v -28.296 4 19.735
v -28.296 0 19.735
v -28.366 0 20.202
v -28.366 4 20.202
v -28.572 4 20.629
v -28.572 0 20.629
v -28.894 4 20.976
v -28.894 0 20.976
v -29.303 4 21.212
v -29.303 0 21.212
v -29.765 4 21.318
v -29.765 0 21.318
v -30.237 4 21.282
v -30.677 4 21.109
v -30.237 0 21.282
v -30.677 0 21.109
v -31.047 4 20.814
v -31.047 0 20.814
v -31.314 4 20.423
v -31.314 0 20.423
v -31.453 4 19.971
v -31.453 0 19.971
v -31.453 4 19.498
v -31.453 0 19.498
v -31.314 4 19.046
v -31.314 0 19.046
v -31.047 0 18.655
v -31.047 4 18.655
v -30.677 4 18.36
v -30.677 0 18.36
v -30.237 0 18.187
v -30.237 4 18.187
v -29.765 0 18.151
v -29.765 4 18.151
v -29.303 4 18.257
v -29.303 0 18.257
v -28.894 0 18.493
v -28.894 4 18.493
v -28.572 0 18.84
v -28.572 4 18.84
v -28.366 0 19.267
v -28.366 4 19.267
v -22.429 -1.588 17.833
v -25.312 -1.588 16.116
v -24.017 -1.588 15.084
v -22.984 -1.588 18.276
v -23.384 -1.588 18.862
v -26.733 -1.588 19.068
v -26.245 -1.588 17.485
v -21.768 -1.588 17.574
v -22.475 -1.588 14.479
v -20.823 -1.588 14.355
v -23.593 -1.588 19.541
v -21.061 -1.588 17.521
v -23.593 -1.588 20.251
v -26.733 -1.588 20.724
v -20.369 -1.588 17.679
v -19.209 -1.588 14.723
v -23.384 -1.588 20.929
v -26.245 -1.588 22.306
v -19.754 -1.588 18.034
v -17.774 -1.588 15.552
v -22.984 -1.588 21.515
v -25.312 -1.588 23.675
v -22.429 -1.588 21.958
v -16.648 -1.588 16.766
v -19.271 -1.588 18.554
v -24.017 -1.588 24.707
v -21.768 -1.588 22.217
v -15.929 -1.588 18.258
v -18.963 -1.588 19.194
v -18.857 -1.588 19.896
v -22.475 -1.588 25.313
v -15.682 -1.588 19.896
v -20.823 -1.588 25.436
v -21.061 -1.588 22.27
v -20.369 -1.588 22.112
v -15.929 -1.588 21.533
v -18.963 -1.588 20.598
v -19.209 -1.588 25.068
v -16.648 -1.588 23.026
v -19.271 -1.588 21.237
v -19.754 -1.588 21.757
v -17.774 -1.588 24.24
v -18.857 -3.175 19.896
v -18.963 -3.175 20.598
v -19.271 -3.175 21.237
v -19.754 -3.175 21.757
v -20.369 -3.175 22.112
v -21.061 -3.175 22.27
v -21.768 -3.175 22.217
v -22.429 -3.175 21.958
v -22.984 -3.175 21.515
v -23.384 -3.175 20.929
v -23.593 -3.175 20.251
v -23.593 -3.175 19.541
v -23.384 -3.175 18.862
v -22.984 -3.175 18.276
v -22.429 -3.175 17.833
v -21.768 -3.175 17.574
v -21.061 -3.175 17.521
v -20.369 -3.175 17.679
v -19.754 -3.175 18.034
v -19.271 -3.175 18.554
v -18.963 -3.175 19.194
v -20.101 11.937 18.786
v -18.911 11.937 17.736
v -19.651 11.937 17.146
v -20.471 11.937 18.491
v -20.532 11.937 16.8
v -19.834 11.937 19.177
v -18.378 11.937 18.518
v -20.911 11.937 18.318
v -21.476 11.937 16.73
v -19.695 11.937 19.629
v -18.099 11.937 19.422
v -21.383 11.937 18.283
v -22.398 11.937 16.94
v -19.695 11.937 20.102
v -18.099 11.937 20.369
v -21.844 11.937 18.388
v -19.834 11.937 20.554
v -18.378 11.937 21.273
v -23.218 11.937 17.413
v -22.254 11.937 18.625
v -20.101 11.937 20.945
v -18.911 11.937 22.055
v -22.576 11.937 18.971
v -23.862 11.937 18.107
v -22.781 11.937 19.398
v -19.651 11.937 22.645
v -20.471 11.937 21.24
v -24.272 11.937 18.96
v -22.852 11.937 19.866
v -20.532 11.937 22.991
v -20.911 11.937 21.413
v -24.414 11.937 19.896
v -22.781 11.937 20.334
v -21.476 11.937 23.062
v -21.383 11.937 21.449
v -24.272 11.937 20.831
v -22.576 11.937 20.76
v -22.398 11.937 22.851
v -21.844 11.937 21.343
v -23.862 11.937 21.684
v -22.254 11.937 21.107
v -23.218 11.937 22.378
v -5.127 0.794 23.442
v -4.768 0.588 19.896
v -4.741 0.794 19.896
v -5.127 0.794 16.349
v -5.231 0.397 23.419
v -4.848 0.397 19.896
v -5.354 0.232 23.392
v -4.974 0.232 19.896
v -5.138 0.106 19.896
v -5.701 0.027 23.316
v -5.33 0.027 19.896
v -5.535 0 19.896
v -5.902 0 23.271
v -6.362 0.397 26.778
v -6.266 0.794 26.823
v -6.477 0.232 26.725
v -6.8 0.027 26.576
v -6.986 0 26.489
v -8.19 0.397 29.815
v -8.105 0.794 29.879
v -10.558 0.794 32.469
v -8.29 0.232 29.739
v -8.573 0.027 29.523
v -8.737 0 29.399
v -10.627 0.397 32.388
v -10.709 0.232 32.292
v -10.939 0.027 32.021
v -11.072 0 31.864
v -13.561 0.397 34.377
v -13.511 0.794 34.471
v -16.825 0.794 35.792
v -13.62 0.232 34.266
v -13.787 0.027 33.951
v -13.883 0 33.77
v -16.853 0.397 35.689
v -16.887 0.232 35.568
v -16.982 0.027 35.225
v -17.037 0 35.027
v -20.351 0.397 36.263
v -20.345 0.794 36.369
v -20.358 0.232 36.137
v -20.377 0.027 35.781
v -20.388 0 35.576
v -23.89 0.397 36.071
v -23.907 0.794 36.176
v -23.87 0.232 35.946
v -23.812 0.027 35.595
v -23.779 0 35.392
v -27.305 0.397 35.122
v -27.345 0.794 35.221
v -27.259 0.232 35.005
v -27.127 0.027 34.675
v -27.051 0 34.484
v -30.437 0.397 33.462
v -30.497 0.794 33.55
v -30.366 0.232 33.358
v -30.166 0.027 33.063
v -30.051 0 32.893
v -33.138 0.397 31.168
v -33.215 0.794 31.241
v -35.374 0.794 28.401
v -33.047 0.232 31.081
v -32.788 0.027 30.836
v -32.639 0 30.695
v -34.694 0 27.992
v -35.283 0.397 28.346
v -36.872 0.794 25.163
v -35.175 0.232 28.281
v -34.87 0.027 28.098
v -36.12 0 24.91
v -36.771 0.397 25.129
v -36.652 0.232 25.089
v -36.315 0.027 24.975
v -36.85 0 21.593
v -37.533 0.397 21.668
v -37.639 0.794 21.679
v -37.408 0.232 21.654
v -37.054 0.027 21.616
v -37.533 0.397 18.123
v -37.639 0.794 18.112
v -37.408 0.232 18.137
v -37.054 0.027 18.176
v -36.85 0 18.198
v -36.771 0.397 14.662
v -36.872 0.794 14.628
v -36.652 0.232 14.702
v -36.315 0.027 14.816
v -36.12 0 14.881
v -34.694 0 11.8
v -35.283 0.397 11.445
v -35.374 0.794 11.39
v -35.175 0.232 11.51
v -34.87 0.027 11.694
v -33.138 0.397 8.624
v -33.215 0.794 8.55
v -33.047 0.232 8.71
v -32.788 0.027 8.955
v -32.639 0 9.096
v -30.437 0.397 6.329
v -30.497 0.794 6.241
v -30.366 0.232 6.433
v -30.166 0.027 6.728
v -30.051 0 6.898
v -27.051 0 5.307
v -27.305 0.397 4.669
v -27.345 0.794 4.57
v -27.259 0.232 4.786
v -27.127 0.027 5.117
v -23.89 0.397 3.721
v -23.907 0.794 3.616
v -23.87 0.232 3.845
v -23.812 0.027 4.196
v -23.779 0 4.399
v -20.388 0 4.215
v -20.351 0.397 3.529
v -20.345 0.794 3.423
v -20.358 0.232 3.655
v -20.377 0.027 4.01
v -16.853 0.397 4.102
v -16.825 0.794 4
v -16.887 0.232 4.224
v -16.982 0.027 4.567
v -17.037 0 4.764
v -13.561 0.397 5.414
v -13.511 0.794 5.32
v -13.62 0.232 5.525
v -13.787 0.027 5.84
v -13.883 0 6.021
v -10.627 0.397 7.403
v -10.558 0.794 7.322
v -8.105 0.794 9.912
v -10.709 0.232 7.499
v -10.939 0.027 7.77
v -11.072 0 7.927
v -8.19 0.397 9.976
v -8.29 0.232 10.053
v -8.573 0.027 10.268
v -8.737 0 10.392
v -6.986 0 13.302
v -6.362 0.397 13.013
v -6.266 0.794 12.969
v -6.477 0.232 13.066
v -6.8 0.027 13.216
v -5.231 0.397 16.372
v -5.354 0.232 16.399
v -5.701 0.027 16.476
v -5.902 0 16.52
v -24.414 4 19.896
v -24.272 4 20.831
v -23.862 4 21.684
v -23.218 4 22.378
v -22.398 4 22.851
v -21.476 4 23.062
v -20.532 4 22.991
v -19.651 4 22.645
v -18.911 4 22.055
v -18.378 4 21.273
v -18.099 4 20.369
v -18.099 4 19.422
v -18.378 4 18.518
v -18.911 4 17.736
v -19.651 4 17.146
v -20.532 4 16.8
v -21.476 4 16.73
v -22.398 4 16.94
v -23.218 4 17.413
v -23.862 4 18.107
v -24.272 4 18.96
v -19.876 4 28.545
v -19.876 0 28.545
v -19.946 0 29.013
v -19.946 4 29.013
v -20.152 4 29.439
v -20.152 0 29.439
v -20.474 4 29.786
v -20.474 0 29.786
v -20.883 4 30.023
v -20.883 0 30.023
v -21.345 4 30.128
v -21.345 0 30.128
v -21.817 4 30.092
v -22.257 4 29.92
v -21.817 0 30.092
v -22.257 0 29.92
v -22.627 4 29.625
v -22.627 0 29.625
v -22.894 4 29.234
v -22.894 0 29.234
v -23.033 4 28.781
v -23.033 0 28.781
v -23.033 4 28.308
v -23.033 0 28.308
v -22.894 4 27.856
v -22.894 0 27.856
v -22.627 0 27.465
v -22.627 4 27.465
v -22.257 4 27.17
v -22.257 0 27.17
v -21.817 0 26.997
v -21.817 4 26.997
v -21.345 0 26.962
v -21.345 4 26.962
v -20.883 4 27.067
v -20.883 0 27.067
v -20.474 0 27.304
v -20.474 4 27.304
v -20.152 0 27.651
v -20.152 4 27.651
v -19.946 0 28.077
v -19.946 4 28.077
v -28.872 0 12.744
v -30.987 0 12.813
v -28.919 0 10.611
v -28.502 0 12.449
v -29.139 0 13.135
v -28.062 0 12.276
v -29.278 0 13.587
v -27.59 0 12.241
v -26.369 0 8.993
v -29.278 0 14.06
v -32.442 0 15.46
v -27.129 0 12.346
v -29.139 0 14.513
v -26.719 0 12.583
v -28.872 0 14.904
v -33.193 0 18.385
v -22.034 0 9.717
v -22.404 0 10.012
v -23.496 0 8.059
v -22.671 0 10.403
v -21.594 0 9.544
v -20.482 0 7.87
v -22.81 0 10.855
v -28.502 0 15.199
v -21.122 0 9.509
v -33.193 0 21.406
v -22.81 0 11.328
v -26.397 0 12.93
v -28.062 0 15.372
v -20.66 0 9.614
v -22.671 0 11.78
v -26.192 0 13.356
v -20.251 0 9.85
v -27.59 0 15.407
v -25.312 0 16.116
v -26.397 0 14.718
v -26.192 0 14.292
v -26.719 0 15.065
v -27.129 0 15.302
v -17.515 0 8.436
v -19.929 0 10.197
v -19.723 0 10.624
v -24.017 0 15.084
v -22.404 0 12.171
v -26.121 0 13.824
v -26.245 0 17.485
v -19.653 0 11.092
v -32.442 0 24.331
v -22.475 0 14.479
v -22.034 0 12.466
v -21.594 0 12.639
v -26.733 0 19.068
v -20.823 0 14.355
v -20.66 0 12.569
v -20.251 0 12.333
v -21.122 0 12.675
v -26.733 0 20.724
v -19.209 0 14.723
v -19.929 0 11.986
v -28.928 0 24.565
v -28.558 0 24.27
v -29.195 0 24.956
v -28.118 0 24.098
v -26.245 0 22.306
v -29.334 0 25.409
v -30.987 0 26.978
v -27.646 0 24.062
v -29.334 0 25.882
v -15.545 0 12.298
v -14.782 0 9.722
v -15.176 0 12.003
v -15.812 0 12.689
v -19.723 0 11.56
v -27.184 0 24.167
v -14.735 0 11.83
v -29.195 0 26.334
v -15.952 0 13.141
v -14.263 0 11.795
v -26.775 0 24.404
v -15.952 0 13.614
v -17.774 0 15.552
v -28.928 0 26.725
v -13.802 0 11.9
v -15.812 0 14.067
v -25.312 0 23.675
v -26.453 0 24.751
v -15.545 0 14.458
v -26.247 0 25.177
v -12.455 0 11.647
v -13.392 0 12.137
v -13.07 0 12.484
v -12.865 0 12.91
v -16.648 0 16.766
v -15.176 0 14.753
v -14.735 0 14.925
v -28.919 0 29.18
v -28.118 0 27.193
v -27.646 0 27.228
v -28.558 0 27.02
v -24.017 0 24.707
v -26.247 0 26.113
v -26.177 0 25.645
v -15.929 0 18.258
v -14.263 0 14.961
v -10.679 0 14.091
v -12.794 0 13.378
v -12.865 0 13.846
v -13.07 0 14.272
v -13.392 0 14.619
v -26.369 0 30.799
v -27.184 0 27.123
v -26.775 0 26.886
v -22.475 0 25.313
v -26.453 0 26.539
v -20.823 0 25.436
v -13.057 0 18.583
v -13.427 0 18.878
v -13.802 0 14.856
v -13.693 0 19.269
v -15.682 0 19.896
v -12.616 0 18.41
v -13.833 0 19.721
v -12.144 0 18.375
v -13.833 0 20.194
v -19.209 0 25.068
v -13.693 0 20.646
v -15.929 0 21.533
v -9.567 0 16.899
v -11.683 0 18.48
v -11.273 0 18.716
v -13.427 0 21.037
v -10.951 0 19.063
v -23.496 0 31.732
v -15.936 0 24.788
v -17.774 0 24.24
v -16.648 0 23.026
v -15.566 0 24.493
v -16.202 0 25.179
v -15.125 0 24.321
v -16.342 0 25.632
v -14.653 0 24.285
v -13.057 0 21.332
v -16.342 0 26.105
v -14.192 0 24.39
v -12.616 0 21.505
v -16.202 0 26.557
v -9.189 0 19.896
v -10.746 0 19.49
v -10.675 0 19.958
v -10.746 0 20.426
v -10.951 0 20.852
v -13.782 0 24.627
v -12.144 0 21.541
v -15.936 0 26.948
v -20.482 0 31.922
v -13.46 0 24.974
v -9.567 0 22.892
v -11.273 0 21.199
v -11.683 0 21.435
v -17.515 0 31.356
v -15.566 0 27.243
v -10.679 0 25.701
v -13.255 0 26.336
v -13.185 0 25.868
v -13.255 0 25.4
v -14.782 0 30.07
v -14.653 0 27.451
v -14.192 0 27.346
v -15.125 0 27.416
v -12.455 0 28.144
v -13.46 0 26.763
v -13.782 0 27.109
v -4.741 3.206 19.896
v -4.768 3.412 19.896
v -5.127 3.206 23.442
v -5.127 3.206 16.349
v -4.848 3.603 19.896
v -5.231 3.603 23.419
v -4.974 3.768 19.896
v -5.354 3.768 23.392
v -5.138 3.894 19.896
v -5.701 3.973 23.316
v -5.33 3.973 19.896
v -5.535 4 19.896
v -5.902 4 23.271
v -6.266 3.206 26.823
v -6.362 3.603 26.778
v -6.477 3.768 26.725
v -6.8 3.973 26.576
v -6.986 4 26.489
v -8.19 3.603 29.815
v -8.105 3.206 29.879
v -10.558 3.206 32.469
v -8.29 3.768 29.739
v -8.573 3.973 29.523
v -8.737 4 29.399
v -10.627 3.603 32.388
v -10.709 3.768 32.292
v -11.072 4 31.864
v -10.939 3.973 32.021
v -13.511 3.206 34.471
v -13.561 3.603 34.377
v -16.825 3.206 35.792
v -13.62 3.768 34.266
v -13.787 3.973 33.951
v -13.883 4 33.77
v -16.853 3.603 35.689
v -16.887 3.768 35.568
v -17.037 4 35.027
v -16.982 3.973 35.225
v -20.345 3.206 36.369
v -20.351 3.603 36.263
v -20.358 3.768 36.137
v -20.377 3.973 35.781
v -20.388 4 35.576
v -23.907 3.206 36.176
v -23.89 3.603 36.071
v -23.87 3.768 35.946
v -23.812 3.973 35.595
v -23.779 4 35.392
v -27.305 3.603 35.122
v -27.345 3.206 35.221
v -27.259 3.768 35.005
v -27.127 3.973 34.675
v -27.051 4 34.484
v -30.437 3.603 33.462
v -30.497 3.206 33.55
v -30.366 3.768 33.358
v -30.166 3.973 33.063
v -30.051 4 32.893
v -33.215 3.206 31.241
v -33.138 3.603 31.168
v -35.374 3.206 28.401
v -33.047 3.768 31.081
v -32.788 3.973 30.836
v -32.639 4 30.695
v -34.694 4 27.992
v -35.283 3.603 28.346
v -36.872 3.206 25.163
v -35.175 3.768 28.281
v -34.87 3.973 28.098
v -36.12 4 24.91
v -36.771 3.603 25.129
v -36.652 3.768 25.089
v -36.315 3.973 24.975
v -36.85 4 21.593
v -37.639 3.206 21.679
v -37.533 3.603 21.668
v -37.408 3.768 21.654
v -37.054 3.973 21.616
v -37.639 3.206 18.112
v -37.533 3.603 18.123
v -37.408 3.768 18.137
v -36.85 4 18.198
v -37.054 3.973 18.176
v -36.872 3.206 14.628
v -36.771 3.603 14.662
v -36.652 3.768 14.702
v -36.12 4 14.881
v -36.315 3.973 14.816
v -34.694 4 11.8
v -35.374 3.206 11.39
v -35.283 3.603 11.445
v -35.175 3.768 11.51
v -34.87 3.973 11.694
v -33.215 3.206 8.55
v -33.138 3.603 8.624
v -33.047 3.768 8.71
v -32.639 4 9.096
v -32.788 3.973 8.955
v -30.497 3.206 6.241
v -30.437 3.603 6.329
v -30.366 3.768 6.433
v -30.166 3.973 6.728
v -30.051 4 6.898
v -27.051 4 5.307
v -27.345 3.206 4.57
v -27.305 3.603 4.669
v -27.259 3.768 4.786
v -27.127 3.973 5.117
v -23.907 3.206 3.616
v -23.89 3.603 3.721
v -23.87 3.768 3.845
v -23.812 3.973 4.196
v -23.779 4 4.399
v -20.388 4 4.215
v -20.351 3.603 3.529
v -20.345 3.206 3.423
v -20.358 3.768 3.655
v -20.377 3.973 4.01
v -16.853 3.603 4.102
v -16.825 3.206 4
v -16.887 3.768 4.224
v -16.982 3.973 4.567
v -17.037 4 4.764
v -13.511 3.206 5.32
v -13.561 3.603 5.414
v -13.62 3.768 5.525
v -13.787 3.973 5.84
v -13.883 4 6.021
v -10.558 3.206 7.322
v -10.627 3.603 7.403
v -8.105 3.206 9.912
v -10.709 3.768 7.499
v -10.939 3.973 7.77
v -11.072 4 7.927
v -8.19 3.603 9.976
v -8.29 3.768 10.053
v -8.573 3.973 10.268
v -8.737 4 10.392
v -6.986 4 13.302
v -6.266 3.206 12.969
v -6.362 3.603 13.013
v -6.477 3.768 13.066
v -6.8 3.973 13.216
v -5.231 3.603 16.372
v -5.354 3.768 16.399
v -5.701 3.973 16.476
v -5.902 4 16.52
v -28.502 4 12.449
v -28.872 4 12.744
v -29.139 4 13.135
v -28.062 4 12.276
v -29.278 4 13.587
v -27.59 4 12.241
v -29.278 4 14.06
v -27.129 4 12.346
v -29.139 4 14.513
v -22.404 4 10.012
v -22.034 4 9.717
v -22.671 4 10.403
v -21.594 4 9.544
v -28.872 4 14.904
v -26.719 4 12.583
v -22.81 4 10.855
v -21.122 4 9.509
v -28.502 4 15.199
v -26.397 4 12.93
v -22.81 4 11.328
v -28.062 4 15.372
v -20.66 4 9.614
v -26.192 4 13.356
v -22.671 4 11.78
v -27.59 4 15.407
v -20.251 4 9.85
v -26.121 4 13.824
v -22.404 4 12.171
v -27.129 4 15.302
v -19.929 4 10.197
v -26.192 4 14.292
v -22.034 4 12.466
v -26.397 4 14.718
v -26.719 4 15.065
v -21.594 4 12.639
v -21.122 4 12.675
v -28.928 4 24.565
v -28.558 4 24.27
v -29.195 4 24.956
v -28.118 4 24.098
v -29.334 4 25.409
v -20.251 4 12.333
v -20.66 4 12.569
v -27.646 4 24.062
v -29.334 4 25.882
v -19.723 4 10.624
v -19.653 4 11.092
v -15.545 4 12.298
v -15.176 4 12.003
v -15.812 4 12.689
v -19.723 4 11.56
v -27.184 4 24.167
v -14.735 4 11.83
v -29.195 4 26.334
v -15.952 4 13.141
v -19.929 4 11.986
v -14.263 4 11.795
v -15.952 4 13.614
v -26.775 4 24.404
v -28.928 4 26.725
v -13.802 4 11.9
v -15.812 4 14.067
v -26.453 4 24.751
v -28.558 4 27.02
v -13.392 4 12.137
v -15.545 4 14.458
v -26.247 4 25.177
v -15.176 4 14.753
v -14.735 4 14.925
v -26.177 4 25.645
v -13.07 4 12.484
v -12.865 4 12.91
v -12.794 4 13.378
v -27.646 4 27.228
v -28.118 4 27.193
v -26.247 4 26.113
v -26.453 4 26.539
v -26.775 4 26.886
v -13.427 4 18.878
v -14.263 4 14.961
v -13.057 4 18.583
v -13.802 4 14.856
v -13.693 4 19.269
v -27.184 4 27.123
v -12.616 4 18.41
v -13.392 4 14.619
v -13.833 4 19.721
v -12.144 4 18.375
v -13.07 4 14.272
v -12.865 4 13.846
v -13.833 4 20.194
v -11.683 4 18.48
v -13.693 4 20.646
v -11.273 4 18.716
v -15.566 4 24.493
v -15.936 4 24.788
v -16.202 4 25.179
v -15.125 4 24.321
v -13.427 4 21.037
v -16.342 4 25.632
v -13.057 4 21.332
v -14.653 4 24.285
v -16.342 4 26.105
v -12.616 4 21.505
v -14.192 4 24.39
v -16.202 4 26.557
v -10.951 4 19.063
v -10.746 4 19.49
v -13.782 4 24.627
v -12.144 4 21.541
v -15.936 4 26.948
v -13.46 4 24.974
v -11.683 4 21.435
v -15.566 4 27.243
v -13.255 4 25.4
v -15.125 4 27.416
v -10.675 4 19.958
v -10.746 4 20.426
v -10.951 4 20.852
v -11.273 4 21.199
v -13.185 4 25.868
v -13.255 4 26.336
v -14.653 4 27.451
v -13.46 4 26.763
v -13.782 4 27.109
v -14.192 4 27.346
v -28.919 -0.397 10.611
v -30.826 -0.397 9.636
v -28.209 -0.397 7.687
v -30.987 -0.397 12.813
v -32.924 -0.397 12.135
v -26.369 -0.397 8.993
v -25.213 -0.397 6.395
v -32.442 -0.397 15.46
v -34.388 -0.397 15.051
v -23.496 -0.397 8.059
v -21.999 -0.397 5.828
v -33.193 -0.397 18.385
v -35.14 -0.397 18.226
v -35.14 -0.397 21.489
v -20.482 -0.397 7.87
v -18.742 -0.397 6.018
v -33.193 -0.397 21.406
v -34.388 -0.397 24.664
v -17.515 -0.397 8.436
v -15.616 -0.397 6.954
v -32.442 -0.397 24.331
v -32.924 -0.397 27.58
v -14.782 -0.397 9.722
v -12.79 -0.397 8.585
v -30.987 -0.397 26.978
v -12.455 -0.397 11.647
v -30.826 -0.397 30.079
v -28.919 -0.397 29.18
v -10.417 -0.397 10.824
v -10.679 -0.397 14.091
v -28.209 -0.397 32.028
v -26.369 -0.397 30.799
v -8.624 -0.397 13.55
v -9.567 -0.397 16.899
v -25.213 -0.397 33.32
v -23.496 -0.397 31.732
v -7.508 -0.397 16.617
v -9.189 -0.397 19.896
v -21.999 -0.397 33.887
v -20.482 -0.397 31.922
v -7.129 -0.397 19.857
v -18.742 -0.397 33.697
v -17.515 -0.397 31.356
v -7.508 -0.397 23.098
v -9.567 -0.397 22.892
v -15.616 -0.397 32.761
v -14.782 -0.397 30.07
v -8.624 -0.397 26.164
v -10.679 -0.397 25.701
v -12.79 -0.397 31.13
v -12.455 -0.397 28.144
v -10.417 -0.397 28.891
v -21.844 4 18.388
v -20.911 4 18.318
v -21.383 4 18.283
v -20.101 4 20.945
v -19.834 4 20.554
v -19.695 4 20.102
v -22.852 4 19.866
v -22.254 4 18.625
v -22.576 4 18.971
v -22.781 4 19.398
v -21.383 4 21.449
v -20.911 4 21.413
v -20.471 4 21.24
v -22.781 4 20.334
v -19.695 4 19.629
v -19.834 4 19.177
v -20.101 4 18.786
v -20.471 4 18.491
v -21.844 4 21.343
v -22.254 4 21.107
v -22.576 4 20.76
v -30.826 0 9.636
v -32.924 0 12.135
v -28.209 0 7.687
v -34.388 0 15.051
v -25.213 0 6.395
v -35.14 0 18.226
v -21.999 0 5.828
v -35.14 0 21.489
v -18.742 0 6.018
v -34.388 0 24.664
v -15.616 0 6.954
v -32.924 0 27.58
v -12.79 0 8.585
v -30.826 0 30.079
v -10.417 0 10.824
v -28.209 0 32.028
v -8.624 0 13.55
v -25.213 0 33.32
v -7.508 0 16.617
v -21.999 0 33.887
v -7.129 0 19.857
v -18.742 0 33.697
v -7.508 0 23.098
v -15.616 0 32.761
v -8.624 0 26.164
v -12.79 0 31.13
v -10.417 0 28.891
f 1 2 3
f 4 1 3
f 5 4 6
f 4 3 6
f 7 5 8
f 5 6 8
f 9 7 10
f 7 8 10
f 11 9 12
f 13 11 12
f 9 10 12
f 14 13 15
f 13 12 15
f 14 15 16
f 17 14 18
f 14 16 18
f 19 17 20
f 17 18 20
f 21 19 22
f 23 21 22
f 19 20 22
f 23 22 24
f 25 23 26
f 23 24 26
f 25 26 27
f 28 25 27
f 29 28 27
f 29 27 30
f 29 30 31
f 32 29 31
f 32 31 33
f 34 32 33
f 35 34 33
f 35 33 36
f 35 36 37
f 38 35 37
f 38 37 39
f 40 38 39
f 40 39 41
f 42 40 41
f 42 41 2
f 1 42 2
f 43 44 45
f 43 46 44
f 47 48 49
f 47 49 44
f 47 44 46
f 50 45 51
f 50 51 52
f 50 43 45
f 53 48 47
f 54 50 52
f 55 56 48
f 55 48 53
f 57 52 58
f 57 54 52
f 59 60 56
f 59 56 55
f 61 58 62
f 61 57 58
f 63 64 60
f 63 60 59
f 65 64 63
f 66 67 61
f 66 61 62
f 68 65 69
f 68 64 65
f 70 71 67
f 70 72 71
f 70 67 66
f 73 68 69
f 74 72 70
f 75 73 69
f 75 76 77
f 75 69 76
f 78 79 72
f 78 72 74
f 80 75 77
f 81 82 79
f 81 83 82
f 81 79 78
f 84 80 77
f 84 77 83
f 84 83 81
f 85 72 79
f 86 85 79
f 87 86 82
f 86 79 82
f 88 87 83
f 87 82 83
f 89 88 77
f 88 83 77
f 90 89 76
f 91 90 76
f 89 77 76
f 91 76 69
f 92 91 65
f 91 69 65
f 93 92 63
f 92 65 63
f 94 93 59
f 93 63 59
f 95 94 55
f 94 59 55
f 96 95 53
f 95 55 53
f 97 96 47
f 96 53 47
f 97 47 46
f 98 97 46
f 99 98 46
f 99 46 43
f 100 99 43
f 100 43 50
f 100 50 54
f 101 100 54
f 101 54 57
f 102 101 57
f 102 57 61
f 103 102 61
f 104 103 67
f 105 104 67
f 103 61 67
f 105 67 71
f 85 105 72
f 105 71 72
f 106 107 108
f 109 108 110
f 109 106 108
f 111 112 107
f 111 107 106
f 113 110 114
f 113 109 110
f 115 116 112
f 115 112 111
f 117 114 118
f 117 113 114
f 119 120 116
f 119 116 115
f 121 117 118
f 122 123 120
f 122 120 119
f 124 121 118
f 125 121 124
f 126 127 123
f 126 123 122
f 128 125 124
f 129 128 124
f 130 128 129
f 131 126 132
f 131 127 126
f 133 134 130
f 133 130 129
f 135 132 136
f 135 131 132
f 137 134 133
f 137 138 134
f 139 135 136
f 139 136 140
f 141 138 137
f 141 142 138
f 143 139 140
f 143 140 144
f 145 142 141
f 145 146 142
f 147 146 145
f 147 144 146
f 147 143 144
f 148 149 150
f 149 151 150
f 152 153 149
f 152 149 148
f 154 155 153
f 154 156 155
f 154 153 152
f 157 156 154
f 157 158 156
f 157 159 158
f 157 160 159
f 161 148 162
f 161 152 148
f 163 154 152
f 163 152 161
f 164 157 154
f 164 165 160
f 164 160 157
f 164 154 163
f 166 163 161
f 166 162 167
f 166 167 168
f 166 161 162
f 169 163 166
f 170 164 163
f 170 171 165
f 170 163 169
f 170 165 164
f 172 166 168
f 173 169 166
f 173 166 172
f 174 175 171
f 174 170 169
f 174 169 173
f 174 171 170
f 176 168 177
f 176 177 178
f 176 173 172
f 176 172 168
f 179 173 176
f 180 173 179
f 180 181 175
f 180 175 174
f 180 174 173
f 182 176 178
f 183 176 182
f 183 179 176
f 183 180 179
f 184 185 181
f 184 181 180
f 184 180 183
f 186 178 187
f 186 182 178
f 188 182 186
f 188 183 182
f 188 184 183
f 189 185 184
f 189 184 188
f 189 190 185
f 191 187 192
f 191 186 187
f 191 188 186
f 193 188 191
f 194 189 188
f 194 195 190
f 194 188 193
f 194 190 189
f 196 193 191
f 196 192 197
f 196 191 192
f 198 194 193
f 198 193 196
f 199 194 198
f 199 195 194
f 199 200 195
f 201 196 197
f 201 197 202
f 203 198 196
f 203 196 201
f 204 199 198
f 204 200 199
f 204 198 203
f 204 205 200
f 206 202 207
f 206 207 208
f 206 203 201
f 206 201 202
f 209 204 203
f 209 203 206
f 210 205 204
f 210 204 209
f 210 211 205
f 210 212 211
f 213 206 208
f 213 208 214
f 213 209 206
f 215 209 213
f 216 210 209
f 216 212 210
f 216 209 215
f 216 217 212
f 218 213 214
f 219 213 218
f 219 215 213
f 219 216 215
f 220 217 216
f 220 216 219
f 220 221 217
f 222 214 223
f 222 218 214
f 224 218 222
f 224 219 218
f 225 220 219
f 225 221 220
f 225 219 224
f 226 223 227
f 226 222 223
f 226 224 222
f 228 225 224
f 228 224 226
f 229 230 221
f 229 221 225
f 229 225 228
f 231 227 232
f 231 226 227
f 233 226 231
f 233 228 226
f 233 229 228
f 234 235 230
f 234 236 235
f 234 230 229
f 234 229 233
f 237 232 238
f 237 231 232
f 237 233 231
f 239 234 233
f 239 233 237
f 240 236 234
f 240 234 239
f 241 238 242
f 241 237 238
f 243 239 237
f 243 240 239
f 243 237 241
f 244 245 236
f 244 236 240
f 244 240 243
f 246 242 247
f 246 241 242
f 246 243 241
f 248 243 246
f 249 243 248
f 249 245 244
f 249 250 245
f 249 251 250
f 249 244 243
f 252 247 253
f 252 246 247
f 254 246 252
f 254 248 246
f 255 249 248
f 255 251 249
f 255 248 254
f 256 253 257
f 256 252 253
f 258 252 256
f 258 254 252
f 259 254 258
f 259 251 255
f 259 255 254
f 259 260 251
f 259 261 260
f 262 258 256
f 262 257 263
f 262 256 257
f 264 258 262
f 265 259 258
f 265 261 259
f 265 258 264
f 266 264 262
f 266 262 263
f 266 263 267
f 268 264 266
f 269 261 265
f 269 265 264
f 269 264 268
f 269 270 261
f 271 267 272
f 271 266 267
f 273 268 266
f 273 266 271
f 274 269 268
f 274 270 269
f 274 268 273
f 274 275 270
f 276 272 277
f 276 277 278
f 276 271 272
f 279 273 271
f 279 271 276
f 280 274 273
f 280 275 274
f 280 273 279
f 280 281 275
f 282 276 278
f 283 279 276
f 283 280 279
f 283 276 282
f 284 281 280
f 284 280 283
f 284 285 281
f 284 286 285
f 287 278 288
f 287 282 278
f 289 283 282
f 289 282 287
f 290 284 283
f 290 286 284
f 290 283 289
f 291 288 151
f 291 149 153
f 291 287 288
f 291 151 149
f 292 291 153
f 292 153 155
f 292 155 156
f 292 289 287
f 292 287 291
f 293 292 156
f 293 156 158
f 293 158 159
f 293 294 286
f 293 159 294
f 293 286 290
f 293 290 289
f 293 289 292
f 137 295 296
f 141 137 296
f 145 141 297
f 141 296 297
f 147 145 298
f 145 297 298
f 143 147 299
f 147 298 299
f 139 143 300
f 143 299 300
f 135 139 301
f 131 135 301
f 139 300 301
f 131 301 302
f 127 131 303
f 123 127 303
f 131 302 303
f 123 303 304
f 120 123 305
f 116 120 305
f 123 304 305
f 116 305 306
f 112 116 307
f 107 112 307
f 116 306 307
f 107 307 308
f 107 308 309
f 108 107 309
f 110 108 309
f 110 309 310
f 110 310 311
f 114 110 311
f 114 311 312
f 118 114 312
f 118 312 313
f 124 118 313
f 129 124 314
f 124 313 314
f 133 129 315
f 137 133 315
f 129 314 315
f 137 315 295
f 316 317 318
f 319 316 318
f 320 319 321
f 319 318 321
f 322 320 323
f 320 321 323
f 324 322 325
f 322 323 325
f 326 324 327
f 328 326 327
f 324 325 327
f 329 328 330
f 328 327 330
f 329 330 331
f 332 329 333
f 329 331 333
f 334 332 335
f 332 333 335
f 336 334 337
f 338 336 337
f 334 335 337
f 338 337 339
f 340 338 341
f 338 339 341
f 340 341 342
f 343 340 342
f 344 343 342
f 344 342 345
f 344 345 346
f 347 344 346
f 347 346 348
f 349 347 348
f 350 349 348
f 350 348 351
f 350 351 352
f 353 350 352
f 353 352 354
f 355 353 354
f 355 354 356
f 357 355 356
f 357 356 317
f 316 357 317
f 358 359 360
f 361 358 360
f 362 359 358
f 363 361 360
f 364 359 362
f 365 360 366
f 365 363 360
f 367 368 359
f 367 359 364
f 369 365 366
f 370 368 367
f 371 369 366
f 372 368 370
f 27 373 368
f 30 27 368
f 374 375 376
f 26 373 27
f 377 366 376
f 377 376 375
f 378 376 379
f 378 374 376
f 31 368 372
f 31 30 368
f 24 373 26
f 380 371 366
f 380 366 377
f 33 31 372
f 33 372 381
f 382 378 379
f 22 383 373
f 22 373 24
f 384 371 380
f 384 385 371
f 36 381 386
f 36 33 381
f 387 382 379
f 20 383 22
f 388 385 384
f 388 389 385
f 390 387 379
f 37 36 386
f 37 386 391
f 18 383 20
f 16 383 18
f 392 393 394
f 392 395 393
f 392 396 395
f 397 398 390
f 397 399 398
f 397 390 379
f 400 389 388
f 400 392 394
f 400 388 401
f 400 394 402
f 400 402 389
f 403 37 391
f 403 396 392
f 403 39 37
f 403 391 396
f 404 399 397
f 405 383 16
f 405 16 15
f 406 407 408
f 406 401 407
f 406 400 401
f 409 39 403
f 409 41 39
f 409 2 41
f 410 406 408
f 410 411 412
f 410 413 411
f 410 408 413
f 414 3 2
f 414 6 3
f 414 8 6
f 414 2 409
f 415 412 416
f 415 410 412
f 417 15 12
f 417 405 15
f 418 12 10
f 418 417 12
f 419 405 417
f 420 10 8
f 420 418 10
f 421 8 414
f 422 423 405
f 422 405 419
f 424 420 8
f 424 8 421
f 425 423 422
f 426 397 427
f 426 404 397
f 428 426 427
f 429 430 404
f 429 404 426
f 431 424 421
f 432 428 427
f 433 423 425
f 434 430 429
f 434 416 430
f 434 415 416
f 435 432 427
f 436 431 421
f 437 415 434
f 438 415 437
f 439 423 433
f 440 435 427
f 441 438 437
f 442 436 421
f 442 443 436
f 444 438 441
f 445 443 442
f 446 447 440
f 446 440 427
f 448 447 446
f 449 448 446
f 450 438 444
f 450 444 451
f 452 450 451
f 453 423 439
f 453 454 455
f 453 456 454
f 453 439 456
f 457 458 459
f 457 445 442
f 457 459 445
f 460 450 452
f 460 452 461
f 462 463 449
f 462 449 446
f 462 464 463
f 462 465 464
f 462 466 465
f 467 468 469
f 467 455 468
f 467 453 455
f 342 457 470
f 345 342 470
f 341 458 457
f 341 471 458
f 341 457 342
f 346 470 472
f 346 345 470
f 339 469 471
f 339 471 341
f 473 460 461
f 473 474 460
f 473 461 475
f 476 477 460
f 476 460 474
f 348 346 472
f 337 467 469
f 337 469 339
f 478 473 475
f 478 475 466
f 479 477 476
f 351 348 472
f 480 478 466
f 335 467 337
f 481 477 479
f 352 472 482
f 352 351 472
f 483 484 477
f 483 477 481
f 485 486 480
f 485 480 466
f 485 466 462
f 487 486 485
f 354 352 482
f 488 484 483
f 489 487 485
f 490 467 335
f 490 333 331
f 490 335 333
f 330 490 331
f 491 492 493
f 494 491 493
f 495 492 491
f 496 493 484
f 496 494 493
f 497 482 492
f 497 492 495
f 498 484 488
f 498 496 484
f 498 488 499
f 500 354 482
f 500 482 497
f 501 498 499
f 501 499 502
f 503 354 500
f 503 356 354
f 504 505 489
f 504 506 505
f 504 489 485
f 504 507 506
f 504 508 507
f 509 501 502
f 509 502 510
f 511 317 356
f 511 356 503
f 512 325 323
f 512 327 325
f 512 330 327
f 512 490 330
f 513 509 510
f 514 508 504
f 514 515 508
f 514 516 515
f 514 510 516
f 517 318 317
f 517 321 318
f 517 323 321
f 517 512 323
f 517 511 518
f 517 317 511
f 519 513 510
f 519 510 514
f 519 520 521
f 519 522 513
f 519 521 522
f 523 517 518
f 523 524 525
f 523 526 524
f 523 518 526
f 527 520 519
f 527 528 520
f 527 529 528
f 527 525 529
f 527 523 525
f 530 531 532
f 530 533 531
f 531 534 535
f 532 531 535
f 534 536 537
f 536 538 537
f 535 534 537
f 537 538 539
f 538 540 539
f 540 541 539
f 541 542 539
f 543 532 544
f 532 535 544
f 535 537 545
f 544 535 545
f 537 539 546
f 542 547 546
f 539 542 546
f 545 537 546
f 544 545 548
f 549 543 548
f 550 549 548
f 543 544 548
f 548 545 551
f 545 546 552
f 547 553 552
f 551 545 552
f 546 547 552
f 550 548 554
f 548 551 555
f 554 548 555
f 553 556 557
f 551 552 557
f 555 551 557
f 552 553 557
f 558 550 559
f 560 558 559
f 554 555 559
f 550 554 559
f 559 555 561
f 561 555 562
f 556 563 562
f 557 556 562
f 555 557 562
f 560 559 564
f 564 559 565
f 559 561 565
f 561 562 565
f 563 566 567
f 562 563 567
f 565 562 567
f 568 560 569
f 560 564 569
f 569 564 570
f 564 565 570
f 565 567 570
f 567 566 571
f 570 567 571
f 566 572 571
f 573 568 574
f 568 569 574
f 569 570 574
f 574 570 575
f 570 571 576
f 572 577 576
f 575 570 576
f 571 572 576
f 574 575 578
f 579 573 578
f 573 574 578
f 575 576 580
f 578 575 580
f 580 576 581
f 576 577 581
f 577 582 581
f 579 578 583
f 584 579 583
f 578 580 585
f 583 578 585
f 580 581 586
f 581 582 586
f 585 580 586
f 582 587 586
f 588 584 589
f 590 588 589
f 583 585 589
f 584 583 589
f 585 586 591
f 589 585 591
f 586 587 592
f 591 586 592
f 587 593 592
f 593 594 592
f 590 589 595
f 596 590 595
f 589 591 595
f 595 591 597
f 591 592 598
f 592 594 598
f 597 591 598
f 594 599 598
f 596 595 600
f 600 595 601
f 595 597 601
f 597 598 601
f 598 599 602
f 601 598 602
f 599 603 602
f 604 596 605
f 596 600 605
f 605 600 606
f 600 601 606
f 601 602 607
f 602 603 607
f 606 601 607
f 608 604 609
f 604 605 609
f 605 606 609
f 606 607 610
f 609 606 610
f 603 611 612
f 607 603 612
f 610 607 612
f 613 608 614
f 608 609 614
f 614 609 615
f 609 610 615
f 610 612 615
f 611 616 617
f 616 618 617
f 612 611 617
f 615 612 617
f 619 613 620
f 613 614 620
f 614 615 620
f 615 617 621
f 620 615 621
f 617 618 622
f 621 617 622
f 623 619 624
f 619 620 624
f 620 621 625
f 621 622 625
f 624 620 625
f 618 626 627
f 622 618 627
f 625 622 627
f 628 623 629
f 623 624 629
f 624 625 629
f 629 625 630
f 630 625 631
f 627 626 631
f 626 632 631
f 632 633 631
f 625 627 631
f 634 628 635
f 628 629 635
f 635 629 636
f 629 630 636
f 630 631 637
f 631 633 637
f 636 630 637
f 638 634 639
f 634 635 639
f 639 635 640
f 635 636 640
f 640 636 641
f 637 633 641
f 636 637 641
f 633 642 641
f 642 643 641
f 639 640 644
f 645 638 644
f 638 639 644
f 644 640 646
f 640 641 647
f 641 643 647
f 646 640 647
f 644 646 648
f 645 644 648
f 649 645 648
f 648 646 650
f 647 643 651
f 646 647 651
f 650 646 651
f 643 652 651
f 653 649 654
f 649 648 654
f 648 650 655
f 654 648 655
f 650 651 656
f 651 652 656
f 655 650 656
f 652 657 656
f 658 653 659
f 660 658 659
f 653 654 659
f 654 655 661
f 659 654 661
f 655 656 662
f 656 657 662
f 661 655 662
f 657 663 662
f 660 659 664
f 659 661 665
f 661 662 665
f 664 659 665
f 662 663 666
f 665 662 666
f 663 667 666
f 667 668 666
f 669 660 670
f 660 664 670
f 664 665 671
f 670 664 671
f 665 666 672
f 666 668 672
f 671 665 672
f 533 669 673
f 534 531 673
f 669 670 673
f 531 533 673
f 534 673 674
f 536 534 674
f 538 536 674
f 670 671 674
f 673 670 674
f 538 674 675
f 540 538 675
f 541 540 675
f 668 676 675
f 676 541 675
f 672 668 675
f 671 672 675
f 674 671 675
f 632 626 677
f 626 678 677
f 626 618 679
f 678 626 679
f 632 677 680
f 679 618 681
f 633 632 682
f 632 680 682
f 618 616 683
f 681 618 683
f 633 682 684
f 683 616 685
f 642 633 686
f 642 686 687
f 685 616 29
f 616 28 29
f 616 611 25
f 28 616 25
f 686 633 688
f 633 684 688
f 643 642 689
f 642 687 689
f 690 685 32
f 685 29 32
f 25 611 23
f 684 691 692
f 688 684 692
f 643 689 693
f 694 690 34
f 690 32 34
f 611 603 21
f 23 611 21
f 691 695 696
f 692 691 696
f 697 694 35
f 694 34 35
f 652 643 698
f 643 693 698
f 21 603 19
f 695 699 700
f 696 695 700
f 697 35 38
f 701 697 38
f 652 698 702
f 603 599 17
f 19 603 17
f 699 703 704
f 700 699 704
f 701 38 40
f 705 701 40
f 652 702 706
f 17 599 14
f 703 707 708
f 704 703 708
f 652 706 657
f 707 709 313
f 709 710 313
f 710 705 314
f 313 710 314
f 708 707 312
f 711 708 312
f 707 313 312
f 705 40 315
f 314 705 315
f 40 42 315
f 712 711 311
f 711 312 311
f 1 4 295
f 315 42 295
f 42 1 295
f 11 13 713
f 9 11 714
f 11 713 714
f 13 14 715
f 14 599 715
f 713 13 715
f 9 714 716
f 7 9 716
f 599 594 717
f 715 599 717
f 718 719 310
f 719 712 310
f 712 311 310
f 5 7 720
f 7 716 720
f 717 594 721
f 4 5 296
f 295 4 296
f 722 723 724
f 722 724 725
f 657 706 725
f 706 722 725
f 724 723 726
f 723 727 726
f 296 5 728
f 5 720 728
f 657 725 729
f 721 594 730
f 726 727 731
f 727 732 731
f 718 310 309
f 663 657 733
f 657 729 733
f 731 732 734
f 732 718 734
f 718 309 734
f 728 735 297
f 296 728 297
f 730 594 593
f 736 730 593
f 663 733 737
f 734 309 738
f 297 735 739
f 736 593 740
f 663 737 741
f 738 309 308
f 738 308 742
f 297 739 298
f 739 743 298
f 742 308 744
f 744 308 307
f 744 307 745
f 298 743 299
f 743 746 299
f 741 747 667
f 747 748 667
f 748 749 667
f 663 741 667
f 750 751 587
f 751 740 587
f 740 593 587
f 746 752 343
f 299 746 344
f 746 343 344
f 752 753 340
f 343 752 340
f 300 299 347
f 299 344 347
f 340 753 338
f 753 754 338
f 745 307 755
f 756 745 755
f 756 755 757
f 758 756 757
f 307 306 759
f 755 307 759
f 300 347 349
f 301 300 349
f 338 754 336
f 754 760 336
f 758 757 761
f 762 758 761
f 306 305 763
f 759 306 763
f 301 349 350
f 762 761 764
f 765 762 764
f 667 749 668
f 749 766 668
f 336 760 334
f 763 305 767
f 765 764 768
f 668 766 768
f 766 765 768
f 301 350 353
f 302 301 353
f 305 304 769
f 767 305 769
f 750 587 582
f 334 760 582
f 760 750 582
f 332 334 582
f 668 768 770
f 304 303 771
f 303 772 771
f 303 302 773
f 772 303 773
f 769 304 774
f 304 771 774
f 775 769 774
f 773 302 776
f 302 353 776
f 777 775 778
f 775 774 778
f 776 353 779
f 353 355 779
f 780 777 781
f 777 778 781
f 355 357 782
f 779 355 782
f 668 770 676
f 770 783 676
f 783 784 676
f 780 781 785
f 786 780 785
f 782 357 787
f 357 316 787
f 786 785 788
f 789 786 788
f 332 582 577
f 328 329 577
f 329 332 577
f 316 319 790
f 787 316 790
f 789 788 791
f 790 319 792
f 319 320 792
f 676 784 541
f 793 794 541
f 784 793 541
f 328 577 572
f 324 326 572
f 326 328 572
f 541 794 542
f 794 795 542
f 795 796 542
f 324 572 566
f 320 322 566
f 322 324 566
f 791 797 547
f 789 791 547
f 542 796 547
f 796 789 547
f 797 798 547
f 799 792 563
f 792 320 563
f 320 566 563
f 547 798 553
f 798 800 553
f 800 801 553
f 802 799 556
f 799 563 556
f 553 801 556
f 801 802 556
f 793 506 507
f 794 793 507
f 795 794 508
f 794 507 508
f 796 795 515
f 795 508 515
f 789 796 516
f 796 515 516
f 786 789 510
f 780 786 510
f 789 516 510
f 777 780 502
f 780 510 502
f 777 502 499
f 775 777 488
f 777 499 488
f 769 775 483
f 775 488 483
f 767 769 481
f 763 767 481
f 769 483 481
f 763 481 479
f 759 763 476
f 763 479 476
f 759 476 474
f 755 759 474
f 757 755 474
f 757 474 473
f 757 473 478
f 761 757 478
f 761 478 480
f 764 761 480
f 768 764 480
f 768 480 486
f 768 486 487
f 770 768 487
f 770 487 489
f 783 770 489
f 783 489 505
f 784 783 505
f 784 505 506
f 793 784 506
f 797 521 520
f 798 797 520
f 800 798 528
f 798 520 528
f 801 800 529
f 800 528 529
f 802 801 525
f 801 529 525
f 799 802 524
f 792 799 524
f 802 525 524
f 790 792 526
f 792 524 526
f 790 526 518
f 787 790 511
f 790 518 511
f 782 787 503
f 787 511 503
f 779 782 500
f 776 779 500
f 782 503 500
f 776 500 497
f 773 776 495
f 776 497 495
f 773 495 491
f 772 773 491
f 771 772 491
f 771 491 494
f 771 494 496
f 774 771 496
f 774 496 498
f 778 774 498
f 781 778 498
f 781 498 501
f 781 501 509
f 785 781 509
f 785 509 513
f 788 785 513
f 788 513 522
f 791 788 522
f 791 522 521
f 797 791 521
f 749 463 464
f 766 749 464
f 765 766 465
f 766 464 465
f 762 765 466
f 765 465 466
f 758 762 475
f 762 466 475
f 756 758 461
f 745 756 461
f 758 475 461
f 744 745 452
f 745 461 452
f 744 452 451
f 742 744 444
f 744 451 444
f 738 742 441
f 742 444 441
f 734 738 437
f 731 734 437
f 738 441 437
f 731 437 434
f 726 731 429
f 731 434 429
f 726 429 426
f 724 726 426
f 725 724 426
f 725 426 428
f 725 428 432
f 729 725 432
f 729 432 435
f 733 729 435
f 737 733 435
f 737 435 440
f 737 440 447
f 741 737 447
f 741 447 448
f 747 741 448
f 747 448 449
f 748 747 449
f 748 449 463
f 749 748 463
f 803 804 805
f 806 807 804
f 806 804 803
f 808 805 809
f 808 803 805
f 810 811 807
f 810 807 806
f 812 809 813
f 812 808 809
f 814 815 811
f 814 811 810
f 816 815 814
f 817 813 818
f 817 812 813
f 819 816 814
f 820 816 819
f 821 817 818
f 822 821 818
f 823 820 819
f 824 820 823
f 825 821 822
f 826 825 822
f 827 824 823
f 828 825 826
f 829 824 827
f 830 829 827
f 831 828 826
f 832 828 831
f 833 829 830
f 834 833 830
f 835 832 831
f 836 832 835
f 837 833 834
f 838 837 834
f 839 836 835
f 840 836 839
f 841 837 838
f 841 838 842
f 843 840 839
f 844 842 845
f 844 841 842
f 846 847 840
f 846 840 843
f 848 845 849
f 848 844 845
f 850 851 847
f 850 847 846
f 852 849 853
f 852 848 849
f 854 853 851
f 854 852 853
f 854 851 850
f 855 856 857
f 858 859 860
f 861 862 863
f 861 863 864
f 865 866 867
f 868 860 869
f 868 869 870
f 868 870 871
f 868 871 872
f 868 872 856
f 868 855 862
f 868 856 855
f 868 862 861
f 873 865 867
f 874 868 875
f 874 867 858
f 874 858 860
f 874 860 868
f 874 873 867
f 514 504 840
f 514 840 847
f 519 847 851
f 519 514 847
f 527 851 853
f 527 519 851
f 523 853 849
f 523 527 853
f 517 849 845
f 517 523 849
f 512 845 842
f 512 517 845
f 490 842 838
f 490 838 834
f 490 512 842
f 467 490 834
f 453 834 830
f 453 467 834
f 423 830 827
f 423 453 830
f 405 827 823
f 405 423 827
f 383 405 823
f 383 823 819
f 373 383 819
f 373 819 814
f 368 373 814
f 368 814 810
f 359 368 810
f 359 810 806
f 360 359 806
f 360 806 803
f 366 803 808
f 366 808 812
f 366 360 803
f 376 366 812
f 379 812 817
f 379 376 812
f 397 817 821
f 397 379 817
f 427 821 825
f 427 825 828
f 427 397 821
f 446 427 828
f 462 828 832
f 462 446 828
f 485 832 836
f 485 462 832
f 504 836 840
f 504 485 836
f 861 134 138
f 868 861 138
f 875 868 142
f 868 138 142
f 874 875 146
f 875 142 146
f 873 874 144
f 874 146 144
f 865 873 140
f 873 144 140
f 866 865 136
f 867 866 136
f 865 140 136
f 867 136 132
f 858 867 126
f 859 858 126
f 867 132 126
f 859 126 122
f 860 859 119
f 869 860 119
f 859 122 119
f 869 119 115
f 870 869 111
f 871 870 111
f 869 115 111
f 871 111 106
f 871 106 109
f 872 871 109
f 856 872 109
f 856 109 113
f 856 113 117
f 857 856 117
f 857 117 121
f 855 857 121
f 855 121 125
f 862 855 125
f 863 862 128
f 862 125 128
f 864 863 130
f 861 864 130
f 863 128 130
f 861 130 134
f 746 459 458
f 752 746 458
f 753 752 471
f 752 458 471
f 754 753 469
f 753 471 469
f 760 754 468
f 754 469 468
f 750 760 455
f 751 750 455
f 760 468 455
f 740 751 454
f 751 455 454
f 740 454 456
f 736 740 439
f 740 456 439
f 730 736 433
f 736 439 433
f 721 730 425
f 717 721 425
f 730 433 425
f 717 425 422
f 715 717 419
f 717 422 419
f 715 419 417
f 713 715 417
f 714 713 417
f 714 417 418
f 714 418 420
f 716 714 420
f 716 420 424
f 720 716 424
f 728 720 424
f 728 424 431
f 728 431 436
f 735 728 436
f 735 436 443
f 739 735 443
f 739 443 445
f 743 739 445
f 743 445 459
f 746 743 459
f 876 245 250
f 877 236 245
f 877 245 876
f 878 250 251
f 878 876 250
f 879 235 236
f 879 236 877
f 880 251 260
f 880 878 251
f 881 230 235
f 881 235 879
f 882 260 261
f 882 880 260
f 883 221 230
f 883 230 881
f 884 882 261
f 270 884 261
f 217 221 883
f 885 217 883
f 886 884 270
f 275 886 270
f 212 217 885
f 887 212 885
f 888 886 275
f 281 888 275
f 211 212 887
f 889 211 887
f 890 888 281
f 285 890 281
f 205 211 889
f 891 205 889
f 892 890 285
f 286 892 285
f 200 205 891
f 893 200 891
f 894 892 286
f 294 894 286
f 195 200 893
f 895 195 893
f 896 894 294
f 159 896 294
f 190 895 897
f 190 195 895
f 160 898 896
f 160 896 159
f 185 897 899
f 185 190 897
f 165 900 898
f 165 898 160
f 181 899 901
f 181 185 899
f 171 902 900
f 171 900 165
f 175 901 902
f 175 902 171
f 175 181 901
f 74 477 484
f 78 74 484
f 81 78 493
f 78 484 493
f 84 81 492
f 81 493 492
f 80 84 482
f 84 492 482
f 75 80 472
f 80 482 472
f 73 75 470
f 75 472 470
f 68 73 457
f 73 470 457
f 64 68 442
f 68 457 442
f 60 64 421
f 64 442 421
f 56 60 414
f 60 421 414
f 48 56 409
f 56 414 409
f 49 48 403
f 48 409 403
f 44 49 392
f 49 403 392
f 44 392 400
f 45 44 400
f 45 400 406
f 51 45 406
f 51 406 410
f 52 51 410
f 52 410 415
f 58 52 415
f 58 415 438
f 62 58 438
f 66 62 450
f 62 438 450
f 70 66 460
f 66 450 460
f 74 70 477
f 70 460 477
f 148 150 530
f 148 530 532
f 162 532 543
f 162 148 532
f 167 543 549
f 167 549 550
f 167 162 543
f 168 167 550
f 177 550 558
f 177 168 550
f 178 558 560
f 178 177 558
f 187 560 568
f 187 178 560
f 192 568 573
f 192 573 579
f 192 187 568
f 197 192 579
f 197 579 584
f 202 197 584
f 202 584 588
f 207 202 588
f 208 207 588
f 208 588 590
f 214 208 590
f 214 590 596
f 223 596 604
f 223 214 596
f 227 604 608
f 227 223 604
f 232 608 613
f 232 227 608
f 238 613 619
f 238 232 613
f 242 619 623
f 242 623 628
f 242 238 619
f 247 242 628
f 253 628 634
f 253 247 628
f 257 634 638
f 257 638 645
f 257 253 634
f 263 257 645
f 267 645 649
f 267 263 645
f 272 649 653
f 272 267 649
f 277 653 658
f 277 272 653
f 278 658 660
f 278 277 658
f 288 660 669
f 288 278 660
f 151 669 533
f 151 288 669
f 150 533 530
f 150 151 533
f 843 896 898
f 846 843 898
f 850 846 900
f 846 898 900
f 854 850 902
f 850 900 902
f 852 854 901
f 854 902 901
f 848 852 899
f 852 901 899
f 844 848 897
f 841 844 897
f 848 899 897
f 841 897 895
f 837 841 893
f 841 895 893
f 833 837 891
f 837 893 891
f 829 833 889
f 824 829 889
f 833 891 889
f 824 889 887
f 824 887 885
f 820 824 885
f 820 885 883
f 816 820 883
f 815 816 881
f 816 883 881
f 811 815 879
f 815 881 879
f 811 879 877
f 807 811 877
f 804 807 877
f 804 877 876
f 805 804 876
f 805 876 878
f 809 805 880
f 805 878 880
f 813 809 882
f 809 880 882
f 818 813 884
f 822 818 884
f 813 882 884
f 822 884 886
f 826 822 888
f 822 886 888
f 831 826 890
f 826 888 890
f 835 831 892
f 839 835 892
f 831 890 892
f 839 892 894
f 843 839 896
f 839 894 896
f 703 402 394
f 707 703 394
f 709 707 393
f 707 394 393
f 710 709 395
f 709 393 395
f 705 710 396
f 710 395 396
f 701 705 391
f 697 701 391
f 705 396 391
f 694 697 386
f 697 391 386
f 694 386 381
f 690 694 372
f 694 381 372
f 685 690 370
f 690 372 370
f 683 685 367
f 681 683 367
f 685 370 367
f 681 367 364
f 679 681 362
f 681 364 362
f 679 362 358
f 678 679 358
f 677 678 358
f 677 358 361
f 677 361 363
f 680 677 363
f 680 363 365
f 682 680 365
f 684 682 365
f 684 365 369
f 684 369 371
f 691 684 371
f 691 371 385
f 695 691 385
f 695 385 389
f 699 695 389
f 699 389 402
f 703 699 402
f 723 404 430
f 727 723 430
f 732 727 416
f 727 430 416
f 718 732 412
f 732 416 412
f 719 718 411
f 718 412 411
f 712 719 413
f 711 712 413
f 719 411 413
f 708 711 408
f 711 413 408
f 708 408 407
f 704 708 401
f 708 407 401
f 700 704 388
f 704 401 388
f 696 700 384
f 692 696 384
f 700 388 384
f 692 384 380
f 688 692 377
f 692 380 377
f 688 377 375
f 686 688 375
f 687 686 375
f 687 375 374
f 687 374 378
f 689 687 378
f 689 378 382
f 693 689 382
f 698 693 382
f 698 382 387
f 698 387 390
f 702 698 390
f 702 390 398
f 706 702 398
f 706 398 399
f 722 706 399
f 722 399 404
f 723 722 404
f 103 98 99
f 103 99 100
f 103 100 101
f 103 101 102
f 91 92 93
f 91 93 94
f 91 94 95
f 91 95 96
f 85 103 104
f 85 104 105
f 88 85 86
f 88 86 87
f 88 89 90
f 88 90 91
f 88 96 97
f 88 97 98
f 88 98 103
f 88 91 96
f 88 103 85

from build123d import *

# Parameters (mm, degrees)
F0_R      = 16.4973
F1_DEPTH  = 3.999992
F2_R      = 0.79375
F3_R      = 1.5875
F4_DEPTH  = 13.208
F5_R      = 1.5875
F6_DEPTH  = 12.7
F7_R      = 1.5875
F8_DEPTH  = 25.4
F9_R      = 1.5875
F10_DEPTH = 25.4
F11_R     = 1.5875
F12_DEPTH = 25.4
F13_R     = 1.5875
F14_DEPTH = 25.4
F15_R     = 1.5875
F16_DEPTH = 25.4
F17_R     = 1.5875
F18_DEPTH = 25.4
F19_R     = 5.55625
F20_DEPTH = 1.5875
F21_R     = 2.38125
F22_DEPTH = 1.5875
F24_R     = 14.053096
F24_R_2   = 12.049687
F25_DEPTH = 0.396875
F26_R     = 3.175
F27_DEPTH = 7.9375
F29_R     = 1.5875
F30_DEPTH = 7.9375


with BuildPart() as f1:
    # F0 (on Front) → F1 (new body)
    with BuildSketch(Plane.XZ):
        with Locations((-21.238506, 19.895638)):
            Circle(F0_R)
    extrude(amount=-F1_DEPTH)

    # F2
    f2_edges = [f1.edges().sort_by_distance(p)[0] for p in [
        (-37.735806, 0, 19.895638),
        (-37.735806, 3.999992, 19.895638),
    ]]
    fillet(f2_edges, radius=F2_R)

    # F3 (on face) → F4 (cut)
    with BuildSketch(Plane.XZ):
        with Locations((-21.463407, 28.544784)):
            Circle(F3_R)
    extrude(amount=-F4_DEPTH, mode=Mode.SUBTRACT)

    # F5 (on face) → F6 (cut)
    with BuildSketch(Plane.XZ):
        with Locations((-21.240363, 11.091588)):
            Circle(F5_R)
    extrude(amount=-F6_DEPTH, mode=Mode.SUBTRACT)

    # F7 (on face) → F8 (cut)
    with BuildSketch(Plane.XZ):
        with Locations((-29.88332, 19.734545)):
            Circle(F7_R)
    extrude(amount=-F8_DEPTH, mode=Mode.SUBTRACT)

    # F9 (on face) → F10 (cut)
    with BuildSketch(Plane.XZ):
        with Locations((-12.26284, 19.957587)):
            Circle(F9_R)
    extrude(amount=-F10_DEPTH, mode=Mode.SUBTRACT)

    # F11 (on face) → F12 (cut)
    with BuildSketch(Plane.XZ):
        with Locations((-27.7644, 25.645211)):
            Circle(F11_R)
    extrude(amount=-F12_DEPTH, mode=Mode.SUBTRACT)

    # F13 (on face) → F14 (cut)
    with BuildSketch(Plane.XZ):
        with Locations((-14.772085, 25.868254)):
            Circle(F13_R)
    extrude(amount=-F14_DEPTH, mode=Mode.SUBTRACT)

    # F15 (on face) → F16 (cut)
    with BuildSketch(Plane.XZ):
        with Locations((-27.708638, 13.823877)):
            Circle(F15_R)
    extrude(amount=-F16_DEPTH, mode=Mode.SUBTRACT)

    # F17 (on face) → F18 (cut)
    with BuildSketch(Plane.XZ):
        with Locations((-14.381759, 13.377788)):
            Circle(F17_R)
    extrude(amount=-F18_DEPTH, mode=Mode.SUBTRACT)

    # F19 (on face) → F20 (join)
    with BuildSketch(Plane.XZ):
        with Locations((-21.238506, 19.895638)):
            Circle(F19_R)
    extrude(amount=F20_DEPTH)

    # F21 (on face) → F22 (join)
    with BuildSketch(Plane.XZ.offset(1.5875)):
        with Locations((-21.238506, 19.895638)):
            Circle(F21_R)
    extrude(amount=F22_DEPTH)

    # F24 (on face) → F25 (join)
    with BuildSketch(Plane.XZ):
        with Locations((-21.182381, 19.857397)):
            Circle(F24_R)
        with Locations((-21.238506, 19.895638)):
            Circle(F24_R_2, mode=Mode.SUBTRACT)
    extrude(amount=F25_DEPTH)

    # F26 (on face) → F27 (join)
    with BuildSketch(Plane(origin=(0, 3.999992, 0), x_dir=(-1, 0, 0), z_dir=(0, 1, 0))):
        with Locations((21.238506, 19.895638)):
            Circle(F26_R)
    extrude(amount=F27_DEPTH)

    # F29 (on face) → F30 (cut)
    with BuildSketch(Plane(origin=(0, 11.937492, 0), x_dir=(-1, 0, 0), z_dir=(0, 1, 0))):
        with Locations((21.264283, 19.865673)):
            Circle(F29_R)
    extrude(amount=-F30_DEPTH, mode=Mode.SUBTRACT)


solid = f1.part
